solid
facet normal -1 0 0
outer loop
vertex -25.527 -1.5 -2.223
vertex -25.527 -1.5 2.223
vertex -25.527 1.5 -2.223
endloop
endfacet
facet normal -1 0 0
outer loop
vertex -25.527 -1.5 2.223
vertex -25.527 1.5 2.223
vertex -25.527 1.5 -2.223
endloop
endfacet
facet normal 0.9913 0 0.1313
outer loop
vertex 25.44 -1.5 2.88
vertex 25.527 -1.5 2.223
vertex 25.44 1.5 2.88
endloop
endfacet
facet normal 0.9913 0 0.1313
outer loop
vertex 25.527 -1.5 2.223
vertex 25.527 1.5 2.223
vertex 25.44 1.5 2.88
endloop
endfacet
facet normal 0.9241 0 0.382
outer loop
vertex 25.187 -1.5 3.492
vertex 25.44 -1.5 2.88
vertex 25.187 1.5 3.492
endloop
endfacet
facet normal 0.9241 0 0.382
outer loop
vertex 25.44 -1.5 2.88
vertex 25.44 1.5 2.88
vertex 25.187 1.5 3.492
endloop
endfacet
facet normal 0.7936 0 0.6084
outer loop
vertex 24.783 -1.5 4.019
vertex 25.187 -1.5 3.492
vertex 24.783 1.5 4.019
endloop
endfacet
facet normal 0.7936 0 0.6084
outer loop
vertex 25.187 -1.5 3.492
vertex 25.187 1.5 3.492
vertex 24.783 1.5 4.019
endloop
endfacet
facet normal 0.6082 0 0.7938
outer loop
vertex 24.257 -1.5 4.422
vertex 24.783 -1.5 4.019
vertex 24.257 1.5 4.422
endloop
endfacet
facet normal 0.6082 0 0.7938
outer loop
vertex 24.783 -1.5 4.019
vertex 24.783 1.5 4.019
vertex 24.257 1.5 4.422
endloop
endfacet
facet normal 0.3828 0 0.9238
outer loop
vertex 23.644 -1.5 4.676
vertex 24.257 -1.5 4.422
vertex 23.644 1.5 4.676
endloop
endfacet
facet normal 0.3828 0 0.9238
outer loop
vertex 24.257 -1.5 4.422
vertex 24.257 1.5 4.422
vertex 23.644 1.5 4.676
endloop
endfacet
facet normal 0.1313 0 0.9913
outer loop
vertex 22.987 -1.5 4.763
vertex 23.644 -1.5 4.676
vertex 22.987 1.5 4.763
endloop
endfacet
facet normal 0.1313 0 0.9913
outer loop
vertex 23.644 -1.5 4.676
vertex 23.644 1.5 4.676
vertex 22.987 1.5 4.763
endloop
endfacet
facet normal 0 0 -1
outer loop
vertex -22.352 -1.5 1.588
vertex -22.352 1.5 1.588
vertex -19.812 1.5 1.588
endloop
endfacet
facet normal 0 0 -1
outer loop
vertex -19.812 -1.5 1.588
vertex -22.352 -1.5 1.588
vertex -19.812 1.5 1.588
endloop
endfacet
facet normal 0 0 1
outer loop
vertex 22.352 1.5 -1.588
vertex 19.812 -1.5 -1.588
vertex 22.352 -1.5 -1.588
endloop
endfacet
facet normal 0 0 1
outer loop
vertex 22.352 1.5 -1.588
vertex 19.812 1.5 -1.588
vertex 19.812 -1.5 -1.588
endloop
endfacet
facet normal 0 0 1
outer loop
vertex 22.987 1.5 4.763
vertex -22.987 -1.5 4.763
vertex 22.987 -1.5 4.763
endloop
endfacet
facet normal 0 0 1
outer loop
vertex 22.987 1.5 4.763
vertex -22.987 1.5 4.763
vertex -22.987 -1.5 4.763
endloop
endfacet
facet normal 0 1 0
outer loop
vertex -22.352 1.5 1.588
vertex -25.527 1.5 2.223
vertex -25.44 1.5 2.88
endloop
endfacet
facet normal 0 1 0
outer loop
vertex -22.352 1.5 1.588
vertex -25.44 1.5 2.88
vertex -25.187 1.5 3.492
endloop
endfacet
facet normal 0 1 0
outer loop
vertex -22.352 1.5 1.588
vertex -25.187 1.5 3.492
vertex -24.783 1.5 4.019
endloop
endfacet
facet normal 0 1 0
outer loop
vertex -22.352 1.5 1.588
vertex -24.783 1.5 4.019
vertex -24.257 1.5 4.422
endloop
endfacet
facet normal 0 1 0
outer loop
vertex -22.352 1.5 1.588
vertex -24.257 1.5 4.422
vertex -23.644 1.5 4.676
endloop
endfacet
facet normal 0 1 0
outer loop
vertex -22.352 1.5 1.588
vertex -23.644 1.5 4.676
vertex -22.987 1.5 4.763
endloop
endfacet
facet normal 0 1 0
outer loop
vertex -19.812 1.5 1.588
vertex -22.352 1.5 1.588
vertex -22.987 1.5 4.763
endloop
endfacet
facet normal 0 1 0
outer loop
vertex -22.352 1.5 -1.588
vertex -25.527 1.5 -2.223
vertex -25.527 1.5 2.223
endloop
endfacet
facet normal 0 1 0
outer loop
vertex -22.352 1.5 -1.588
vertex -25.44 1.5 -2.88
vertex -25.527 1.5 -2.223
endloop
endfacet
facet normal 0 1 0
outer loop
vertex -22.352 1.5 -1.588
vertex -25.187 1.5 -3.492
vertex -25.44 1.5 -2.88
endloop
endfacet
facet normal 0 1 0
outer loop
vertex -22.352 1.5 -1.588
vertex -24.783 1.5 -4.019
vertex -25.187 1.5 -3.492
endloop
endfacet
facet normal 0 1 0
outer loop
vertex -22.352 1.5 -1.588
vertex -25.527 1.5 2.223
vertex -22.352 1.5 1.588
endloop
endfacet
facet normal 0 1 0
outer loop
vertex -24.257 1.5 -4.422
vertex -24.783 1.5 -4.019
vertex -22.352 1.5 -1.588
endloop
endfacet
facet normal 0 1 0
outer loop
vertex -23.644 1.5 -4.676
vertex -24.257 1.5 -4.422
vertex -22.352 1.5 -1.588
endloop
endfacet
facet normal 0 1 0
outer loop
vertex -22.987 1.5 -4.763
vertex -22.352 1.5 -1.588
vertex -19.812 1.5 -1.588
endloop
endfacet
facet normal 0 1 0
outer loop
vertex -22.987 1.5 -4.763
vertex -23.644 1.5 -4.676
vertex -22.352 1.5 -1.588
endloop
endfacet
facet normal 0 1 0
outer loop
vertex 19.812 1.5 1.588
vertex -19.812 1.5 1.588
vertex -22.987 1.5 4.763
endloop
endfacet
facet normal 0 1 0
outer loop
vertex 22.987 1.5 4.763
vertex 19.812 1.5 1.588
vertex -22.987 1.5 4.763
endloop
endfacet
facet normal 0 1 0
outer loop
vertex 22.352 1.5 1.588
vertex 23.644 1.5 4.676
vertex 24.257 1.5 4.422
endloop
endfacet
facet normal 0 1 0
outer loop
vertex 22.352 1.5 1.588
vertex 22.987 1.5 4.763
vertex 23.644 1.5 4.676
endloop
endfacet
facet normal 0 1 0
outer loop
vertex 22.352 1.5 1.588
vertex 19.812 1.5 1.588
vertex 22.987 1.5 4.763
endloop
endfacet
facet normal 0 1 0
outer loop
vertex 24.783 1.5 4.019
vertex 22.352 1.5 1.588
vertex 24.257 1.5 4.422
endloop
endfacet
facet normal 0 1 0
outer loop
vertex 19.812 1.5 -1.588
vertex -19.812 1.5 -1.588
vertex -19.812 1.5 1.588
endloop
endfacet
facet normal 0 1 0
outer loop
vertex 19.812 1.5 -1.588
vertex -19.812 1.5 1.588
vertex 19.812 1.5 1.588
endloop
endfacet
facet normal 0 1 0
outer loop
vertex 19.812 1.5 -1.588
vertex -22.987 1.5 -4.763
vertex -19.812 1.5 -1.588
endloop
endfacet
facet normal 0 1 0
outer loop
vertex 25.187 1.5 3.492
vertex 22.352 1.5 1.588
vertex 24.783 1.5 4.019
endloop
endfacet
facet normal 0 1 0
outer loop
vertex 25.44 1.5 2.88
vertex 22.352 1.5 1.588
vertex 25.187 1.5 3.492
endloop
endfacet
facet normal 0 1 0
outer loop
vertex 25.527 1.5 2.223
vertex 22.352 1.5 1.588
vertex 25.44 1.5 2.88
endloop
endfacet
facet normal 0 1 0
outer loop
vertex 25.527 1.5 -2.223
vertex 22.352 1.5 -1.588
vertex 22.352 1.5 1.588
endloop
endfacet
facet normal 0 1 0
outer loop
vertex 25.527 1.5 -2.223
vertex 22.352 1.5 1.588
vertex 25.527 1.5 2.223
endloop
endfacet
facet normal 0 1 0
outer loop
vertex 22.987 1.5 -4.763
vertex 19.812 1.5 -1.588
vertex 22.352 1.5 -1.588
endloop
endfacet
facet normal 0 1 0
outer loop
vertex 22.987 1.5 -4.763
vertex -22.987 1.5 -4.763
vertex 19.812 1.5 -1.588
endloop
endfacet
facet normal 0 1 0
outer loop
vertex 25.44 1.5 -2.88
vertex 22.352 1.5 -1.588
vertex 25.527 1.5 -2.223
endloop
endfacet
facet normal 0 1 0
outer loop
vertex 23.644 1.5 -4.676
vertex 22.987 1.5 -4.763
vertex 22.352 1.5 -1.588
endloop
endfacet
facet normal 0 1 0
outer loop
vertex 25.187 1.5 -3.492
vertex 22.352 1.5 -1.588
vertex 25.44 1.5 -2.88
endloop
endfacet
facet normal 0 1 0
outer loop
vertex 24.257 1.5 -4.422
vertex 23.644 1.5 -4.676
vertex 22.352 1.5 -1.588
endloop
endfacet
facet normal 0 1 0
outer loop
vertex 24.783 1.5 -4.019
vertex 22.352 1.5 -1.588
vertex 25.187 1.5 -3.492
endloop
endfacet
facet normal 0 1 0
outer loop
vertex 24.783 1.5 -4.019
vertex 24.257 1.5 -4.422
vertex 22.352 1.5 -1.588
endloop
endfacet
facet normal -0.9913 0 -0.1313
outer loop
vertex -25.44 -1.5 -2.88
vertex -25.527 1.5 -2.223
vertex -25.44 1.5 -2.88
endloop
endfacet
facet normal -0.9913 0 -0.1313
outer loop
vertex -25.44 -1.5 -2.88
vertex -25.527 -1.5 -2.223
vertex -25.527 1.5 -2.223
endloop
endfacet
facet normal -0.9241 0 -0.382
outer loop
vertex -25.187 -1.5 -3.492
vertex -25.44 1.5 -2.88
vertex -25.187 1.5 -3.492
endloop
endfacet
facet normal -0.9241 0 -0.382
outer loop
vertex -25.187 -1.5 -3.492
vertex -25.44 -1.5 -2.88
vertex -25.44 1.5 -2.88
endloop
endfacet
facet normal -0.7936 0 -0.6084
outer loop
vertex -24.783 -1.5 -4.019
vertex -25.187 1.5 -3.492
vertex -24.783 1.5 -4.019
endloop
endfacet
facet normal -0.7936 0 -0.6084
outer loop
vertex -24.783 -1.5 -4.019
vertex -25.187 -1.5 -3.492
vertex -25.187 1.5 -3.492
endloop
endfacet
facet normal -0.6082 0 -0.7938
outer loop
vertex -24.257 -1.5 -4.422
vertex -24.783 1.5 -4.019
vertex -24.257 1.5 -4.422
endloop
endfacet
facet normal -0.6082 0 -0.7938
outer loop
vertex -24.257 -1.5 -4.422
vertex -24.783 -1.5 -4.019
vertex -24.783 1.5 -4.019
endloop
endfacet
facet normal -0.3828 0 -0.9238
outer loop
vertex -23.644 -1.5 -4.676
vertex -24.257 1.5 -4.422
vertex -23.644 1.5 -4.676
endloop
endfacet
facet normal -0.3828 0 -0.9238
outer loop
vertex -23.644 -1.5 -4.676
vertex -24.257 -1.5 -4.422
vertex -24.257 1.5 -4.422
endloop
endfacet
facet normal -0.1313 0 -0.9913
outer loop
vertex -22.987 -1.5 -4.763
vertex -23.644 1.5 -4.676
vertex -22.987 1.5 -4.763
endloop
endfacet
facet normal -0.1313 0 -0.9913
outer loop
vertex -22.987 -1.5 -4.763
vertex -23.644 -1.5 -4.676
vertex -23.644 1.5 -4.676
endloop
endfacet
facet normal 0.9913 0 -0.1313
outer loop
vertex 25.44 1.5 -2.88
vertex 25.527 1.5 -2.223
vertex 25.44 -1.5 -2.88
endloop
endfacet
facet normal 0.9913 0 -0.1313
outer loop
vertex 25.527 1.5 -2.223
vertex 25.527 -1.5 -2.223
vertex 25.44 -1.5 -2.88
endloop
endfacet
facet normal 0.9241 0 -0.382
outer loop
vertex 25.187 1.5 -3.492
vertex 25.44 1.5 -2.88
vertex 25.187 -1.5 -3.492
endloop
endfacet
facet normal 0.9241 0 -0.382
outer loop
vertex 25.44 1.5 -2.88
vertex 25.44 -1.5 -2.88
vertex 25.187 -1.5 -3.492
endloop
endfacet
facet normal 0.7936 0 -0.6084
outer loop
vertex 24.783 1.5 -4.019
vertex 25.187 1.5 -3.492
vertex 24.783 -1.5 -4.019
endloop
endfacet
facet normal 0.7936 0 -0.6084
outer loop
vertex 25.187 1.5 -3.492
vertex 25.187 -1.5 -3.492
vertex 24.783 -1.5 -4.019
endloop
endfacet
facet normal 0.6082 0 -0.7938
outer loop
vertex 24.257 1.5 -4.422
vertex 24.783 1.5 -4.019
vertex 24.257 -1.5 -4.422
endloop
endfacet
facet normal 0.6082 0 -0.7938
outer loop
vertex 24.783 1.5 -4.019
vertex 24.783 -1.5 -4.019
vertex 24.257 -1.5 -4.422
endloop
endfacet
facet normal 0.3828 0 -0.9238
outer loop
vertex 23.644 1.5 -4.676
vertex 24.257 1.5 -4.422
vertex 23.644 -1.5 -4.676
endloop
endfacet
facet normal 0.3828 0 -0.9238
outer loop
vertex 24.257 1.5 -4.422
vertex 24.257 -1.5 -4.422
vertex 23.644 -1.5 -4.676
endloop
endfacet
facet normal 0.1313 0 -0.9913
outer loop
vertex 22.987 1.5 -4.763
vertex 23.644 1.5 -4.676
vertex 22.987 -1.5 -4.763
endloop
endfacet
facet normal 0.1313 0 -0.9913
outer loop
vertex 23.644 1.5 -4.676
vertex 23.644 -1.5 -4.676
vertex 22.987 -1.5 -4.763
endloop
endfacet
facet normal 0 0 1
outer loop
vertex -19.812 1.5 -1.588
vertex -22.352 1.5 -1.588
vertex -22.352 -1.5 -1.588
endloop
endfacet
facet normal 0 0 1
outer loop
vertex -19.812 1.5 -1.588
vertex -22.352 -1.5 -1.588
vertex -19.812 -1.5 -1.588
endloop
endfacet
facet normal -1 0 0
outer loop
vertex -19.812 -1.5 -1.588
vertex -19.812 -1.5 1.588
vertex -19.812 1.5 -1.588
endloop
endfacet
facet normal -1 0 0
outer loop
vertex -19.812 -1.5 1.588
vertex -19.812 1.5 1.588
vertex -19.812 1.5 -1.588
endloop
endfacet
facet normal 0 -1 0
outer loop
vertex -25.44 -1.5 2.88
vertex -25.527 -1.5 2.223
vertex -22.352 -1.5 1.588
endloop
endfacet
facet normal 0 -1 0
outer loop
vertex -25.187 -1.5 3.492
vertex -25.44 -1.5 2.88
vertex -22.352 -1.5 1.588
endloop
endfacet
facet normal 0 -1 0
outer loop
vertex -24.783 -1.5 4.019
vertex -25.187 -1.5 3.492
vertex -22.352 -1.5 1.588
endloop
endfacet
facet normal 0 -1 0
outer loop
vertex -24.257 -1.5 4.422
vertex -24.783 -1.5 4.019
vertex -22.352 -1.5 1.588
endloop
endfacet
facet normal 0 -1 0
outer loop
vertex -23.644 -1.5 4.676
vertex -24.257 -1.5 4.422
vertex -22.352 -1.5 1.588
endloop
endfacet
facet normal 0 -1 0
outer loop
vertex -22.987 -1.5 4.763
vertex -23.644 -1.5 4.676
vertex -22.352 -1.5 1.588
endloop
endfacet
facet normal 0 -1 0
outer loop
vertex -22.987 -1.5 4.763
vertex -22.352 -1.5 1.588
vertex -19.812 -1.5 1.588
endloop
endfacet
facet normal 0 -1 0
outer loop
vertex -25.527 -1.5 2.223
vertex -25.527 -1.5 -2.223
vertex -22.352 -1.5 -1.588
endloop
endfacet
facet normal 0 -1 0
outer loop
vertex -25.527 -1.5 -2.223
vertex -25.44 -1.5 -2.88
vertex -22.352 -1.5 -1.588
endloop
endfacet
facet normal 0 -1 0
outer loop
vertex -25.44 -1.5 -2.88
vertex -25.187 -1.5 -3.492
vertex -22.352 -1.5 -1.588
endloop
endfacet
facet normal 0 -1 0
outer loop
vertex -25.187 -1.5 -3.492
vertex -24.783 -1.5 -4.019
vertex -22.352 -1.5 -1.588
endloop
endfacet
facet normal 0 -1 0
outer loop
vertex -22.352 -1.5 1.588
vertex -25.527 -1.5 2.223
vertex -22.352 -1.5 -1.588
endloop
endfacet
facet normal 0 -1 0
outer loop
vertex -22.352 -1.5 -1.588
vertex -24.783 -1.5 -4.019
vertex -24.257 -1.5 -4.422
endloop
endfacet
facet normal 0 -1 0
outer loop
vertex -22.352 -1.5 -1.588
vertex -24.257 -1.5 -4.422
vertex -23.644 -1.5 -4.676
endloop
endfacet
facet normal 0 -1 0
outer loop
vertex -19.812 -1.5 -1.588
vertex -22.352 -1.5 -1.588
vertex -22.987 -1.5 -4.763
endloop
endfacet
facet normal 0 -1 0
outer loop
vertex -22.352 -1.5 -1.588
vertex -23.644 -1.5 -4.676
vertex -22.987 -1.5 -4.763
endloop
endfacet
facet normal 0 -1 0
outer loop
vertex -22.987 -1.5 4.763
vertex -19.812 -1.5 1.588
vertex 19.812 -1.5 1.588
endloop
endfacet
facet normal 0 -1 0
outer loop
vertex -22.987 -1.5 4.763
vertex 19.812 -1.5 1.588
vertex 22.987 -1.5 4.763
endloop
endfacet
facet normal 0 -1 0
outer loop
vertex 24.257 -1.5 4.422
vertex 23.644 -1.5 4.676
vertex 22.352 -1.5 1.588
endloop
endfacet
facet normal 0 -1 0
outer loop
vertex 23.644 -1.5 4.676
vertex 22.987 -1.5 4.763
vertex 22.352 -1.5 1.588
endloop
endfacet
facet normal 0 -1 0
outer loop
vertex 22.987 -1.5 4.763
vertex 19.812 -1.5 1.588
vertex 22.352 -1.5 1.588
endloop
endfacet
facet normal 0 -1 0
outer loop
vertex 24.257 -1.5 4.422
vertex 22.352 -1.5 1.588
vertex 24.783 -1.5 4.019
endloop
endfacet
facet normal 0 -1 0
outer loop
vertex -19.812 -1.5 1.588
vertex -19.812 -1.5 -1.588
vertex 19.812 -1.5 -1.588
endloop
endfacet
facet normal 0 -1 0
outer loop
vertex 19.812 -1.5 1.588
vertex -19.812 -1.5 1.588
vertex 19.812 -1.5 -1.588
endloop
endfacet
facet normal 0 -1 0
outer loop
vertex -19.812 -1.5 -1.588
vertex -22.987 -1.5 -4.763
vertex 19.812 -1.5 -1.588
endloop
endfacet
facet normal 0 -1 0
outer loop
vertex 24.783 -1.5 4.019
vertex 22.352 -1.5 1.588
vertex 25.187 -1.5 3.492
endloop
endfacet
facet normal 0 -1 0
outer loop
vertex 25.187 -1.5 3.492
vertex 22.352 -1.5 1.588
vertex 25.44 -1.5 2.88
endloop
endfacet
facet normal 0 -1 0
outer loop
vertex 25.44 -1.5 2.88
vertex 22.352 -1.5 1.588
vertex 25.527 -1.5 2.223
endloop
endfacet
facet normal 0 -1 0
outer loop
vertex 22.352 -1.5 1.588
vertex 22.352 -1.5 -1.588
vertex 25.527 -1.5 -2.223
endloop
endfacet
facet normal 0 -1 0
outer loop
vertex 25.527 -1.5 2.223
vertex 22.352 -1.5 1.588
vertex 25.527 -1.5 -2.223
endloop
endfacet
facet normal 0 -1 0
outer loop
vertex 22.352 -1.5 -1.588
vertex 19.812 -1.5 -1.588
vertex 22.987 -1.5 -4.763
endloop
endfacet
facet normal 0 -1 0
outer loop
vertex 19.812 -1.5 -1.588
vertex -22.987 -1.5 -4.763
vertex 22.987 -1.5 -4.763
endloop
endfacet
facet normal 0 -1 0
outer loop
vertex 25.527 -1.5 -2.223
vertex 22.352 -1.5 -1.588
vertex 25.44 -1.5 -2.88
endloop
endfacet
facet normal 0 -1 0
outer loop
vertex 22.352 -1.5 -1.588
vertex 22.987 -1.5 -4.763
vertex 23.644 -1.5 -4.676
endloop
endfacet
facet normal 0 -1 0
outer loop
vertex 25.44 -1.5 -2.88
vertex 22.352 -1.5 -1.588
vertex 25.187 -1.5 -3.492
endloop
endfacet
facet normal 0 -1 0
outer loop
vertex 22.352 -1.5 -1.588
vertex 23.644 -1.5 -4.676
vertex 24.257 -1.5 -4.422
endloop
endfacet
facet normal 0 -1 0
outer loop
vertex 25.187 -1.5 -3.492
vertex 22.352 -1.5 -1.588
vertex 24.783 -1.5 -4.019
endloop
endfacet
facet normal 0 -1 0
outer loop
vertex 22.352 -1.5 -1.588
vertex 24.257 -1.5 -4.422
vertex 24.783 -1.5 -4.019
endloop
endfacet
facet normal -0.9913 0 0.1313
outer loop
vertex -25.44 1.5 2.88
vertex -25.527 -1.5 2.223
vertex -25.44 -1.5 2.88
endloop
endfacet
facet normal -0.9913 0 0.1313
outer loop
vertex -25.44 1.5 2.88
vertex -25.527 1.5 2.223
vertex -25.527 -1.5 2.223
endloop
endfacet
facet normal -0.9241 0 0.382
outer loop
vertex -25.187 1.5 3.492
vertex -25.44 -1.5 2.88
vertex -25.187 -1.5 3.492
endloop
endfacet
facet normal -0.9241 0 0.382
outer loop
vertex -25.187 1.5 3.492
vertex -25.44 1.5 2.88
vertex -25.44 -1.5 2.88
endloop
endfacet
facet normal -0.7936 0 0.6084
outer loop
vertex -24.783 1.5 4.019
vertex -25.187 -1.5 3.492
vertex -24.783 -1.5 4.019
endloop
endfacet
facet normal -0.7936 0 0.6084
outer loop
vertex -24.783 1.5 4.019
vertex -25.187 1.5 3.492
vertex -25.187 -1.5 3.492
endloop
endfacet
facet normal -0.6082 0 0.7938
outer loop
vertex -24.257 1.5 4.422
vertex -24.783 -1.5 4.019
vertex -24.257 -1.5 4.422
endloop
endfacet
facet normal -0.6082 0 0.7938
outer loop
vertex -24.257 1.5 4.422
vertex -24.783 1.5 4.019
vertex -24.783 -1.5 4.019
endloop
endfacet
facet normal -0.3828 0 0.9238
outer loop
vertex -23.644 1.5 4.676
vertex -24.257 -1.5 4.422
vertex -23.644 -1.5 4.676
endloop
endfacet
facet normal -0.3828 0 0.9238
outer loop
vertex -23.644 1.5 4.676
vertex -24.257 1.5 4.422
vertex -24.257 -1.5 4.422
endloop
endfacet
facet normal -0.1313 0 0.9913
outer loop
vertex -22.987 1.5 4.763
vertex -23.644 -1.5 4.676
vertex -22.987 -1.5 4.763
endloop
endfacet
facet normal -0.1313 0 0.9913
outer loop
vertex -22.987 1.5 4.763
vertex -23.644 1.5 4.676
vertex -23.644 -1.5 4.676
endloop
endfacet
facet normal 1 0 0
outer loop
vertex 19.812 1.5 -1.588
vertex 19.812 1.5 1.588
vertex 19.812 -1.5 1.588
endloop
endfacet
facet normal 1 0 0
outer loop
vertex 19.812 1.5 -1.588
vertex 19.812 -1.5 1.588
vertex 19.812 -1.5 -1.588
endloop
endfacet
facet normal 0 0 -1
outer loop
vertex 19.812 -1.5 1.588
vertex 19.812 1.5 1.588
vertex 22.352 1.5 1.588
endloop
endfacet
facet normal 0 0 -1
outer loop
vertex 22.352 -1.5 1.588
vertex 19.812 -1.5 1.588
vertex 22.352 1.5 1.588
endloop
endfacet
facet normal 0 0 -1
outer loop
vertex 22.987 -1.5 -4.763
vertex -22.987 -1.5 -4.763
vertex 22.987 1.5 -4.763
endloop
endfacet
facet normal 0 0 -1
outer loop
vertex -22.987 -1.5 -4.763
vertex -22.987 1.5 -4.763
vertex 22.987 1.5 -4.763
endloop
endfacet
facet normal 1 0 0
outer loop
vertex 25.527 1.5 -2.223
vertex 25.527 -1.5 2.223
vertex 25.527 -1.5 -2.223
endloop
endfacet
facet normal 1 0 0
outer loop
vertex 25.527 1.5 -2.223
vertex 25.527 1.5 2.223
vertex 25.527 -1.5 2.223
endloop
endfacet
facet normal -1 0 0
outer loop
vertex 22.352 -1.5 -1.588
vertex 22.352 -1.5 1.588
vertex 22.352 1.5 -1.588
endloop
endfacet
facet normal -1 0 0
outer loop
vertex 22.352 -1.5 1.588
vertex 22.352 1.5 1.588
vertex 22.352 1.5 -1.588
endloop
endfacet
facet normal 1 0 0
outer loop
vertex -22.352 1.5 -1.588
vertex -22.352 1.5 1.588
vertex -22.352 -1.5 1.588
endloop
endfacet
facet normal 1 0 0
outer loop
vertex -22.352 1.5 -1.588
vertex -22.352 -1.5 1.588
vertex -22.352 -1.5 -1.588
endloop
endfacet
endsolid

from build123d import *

# Parameters (mm, degrees)
SKETCH1_W           = 51.054
SKETCH1_H           = 9.525
SKETCH1_W_2         = 2.54
SKETCH1_H_2         = 3.175
BOSS_EXTRUDE1_DEPTH = 1.5
FILLET1_R           = 2.54


with BuildPart() as part:
    # Sketch1 → Boss-Extrude1 (new, symmetric)
    with BuildSketch(Plane(origin=(0, 0, 0), x_dir=(1, 0, 0), z_dir=(0, 1, 0))):
        Rectangle(SKETCH1_W, SKETCH1_H)
        with Locations((-21.082, 0)):
            Rectangle(SKETCH1_W_2, SKETCH1_H_2, mode=Mode.SUBTRACT)
        with Locations((21.082, 0)):
            Rectangle(SKETCH1_W_2, SKETCH1_H_2, mode=Mode.SUBTRACT)
    extrude(amount=BOSS_EXTRUDE1_DEPTH, both=True)

    # Fillet1
    fillet1_edges = [part.edges().sort_by_distance(p)[0] for p in [
        (-25.527, 0, -4.7625),
        (25.527, 0, -4.7625),
        (25.527, 0, 4.7625),
        (-25.527, 0, 4.7625),
    ]]
    fillet(fillet1_edges, radius=FILLET1_R)


solid = part.part
